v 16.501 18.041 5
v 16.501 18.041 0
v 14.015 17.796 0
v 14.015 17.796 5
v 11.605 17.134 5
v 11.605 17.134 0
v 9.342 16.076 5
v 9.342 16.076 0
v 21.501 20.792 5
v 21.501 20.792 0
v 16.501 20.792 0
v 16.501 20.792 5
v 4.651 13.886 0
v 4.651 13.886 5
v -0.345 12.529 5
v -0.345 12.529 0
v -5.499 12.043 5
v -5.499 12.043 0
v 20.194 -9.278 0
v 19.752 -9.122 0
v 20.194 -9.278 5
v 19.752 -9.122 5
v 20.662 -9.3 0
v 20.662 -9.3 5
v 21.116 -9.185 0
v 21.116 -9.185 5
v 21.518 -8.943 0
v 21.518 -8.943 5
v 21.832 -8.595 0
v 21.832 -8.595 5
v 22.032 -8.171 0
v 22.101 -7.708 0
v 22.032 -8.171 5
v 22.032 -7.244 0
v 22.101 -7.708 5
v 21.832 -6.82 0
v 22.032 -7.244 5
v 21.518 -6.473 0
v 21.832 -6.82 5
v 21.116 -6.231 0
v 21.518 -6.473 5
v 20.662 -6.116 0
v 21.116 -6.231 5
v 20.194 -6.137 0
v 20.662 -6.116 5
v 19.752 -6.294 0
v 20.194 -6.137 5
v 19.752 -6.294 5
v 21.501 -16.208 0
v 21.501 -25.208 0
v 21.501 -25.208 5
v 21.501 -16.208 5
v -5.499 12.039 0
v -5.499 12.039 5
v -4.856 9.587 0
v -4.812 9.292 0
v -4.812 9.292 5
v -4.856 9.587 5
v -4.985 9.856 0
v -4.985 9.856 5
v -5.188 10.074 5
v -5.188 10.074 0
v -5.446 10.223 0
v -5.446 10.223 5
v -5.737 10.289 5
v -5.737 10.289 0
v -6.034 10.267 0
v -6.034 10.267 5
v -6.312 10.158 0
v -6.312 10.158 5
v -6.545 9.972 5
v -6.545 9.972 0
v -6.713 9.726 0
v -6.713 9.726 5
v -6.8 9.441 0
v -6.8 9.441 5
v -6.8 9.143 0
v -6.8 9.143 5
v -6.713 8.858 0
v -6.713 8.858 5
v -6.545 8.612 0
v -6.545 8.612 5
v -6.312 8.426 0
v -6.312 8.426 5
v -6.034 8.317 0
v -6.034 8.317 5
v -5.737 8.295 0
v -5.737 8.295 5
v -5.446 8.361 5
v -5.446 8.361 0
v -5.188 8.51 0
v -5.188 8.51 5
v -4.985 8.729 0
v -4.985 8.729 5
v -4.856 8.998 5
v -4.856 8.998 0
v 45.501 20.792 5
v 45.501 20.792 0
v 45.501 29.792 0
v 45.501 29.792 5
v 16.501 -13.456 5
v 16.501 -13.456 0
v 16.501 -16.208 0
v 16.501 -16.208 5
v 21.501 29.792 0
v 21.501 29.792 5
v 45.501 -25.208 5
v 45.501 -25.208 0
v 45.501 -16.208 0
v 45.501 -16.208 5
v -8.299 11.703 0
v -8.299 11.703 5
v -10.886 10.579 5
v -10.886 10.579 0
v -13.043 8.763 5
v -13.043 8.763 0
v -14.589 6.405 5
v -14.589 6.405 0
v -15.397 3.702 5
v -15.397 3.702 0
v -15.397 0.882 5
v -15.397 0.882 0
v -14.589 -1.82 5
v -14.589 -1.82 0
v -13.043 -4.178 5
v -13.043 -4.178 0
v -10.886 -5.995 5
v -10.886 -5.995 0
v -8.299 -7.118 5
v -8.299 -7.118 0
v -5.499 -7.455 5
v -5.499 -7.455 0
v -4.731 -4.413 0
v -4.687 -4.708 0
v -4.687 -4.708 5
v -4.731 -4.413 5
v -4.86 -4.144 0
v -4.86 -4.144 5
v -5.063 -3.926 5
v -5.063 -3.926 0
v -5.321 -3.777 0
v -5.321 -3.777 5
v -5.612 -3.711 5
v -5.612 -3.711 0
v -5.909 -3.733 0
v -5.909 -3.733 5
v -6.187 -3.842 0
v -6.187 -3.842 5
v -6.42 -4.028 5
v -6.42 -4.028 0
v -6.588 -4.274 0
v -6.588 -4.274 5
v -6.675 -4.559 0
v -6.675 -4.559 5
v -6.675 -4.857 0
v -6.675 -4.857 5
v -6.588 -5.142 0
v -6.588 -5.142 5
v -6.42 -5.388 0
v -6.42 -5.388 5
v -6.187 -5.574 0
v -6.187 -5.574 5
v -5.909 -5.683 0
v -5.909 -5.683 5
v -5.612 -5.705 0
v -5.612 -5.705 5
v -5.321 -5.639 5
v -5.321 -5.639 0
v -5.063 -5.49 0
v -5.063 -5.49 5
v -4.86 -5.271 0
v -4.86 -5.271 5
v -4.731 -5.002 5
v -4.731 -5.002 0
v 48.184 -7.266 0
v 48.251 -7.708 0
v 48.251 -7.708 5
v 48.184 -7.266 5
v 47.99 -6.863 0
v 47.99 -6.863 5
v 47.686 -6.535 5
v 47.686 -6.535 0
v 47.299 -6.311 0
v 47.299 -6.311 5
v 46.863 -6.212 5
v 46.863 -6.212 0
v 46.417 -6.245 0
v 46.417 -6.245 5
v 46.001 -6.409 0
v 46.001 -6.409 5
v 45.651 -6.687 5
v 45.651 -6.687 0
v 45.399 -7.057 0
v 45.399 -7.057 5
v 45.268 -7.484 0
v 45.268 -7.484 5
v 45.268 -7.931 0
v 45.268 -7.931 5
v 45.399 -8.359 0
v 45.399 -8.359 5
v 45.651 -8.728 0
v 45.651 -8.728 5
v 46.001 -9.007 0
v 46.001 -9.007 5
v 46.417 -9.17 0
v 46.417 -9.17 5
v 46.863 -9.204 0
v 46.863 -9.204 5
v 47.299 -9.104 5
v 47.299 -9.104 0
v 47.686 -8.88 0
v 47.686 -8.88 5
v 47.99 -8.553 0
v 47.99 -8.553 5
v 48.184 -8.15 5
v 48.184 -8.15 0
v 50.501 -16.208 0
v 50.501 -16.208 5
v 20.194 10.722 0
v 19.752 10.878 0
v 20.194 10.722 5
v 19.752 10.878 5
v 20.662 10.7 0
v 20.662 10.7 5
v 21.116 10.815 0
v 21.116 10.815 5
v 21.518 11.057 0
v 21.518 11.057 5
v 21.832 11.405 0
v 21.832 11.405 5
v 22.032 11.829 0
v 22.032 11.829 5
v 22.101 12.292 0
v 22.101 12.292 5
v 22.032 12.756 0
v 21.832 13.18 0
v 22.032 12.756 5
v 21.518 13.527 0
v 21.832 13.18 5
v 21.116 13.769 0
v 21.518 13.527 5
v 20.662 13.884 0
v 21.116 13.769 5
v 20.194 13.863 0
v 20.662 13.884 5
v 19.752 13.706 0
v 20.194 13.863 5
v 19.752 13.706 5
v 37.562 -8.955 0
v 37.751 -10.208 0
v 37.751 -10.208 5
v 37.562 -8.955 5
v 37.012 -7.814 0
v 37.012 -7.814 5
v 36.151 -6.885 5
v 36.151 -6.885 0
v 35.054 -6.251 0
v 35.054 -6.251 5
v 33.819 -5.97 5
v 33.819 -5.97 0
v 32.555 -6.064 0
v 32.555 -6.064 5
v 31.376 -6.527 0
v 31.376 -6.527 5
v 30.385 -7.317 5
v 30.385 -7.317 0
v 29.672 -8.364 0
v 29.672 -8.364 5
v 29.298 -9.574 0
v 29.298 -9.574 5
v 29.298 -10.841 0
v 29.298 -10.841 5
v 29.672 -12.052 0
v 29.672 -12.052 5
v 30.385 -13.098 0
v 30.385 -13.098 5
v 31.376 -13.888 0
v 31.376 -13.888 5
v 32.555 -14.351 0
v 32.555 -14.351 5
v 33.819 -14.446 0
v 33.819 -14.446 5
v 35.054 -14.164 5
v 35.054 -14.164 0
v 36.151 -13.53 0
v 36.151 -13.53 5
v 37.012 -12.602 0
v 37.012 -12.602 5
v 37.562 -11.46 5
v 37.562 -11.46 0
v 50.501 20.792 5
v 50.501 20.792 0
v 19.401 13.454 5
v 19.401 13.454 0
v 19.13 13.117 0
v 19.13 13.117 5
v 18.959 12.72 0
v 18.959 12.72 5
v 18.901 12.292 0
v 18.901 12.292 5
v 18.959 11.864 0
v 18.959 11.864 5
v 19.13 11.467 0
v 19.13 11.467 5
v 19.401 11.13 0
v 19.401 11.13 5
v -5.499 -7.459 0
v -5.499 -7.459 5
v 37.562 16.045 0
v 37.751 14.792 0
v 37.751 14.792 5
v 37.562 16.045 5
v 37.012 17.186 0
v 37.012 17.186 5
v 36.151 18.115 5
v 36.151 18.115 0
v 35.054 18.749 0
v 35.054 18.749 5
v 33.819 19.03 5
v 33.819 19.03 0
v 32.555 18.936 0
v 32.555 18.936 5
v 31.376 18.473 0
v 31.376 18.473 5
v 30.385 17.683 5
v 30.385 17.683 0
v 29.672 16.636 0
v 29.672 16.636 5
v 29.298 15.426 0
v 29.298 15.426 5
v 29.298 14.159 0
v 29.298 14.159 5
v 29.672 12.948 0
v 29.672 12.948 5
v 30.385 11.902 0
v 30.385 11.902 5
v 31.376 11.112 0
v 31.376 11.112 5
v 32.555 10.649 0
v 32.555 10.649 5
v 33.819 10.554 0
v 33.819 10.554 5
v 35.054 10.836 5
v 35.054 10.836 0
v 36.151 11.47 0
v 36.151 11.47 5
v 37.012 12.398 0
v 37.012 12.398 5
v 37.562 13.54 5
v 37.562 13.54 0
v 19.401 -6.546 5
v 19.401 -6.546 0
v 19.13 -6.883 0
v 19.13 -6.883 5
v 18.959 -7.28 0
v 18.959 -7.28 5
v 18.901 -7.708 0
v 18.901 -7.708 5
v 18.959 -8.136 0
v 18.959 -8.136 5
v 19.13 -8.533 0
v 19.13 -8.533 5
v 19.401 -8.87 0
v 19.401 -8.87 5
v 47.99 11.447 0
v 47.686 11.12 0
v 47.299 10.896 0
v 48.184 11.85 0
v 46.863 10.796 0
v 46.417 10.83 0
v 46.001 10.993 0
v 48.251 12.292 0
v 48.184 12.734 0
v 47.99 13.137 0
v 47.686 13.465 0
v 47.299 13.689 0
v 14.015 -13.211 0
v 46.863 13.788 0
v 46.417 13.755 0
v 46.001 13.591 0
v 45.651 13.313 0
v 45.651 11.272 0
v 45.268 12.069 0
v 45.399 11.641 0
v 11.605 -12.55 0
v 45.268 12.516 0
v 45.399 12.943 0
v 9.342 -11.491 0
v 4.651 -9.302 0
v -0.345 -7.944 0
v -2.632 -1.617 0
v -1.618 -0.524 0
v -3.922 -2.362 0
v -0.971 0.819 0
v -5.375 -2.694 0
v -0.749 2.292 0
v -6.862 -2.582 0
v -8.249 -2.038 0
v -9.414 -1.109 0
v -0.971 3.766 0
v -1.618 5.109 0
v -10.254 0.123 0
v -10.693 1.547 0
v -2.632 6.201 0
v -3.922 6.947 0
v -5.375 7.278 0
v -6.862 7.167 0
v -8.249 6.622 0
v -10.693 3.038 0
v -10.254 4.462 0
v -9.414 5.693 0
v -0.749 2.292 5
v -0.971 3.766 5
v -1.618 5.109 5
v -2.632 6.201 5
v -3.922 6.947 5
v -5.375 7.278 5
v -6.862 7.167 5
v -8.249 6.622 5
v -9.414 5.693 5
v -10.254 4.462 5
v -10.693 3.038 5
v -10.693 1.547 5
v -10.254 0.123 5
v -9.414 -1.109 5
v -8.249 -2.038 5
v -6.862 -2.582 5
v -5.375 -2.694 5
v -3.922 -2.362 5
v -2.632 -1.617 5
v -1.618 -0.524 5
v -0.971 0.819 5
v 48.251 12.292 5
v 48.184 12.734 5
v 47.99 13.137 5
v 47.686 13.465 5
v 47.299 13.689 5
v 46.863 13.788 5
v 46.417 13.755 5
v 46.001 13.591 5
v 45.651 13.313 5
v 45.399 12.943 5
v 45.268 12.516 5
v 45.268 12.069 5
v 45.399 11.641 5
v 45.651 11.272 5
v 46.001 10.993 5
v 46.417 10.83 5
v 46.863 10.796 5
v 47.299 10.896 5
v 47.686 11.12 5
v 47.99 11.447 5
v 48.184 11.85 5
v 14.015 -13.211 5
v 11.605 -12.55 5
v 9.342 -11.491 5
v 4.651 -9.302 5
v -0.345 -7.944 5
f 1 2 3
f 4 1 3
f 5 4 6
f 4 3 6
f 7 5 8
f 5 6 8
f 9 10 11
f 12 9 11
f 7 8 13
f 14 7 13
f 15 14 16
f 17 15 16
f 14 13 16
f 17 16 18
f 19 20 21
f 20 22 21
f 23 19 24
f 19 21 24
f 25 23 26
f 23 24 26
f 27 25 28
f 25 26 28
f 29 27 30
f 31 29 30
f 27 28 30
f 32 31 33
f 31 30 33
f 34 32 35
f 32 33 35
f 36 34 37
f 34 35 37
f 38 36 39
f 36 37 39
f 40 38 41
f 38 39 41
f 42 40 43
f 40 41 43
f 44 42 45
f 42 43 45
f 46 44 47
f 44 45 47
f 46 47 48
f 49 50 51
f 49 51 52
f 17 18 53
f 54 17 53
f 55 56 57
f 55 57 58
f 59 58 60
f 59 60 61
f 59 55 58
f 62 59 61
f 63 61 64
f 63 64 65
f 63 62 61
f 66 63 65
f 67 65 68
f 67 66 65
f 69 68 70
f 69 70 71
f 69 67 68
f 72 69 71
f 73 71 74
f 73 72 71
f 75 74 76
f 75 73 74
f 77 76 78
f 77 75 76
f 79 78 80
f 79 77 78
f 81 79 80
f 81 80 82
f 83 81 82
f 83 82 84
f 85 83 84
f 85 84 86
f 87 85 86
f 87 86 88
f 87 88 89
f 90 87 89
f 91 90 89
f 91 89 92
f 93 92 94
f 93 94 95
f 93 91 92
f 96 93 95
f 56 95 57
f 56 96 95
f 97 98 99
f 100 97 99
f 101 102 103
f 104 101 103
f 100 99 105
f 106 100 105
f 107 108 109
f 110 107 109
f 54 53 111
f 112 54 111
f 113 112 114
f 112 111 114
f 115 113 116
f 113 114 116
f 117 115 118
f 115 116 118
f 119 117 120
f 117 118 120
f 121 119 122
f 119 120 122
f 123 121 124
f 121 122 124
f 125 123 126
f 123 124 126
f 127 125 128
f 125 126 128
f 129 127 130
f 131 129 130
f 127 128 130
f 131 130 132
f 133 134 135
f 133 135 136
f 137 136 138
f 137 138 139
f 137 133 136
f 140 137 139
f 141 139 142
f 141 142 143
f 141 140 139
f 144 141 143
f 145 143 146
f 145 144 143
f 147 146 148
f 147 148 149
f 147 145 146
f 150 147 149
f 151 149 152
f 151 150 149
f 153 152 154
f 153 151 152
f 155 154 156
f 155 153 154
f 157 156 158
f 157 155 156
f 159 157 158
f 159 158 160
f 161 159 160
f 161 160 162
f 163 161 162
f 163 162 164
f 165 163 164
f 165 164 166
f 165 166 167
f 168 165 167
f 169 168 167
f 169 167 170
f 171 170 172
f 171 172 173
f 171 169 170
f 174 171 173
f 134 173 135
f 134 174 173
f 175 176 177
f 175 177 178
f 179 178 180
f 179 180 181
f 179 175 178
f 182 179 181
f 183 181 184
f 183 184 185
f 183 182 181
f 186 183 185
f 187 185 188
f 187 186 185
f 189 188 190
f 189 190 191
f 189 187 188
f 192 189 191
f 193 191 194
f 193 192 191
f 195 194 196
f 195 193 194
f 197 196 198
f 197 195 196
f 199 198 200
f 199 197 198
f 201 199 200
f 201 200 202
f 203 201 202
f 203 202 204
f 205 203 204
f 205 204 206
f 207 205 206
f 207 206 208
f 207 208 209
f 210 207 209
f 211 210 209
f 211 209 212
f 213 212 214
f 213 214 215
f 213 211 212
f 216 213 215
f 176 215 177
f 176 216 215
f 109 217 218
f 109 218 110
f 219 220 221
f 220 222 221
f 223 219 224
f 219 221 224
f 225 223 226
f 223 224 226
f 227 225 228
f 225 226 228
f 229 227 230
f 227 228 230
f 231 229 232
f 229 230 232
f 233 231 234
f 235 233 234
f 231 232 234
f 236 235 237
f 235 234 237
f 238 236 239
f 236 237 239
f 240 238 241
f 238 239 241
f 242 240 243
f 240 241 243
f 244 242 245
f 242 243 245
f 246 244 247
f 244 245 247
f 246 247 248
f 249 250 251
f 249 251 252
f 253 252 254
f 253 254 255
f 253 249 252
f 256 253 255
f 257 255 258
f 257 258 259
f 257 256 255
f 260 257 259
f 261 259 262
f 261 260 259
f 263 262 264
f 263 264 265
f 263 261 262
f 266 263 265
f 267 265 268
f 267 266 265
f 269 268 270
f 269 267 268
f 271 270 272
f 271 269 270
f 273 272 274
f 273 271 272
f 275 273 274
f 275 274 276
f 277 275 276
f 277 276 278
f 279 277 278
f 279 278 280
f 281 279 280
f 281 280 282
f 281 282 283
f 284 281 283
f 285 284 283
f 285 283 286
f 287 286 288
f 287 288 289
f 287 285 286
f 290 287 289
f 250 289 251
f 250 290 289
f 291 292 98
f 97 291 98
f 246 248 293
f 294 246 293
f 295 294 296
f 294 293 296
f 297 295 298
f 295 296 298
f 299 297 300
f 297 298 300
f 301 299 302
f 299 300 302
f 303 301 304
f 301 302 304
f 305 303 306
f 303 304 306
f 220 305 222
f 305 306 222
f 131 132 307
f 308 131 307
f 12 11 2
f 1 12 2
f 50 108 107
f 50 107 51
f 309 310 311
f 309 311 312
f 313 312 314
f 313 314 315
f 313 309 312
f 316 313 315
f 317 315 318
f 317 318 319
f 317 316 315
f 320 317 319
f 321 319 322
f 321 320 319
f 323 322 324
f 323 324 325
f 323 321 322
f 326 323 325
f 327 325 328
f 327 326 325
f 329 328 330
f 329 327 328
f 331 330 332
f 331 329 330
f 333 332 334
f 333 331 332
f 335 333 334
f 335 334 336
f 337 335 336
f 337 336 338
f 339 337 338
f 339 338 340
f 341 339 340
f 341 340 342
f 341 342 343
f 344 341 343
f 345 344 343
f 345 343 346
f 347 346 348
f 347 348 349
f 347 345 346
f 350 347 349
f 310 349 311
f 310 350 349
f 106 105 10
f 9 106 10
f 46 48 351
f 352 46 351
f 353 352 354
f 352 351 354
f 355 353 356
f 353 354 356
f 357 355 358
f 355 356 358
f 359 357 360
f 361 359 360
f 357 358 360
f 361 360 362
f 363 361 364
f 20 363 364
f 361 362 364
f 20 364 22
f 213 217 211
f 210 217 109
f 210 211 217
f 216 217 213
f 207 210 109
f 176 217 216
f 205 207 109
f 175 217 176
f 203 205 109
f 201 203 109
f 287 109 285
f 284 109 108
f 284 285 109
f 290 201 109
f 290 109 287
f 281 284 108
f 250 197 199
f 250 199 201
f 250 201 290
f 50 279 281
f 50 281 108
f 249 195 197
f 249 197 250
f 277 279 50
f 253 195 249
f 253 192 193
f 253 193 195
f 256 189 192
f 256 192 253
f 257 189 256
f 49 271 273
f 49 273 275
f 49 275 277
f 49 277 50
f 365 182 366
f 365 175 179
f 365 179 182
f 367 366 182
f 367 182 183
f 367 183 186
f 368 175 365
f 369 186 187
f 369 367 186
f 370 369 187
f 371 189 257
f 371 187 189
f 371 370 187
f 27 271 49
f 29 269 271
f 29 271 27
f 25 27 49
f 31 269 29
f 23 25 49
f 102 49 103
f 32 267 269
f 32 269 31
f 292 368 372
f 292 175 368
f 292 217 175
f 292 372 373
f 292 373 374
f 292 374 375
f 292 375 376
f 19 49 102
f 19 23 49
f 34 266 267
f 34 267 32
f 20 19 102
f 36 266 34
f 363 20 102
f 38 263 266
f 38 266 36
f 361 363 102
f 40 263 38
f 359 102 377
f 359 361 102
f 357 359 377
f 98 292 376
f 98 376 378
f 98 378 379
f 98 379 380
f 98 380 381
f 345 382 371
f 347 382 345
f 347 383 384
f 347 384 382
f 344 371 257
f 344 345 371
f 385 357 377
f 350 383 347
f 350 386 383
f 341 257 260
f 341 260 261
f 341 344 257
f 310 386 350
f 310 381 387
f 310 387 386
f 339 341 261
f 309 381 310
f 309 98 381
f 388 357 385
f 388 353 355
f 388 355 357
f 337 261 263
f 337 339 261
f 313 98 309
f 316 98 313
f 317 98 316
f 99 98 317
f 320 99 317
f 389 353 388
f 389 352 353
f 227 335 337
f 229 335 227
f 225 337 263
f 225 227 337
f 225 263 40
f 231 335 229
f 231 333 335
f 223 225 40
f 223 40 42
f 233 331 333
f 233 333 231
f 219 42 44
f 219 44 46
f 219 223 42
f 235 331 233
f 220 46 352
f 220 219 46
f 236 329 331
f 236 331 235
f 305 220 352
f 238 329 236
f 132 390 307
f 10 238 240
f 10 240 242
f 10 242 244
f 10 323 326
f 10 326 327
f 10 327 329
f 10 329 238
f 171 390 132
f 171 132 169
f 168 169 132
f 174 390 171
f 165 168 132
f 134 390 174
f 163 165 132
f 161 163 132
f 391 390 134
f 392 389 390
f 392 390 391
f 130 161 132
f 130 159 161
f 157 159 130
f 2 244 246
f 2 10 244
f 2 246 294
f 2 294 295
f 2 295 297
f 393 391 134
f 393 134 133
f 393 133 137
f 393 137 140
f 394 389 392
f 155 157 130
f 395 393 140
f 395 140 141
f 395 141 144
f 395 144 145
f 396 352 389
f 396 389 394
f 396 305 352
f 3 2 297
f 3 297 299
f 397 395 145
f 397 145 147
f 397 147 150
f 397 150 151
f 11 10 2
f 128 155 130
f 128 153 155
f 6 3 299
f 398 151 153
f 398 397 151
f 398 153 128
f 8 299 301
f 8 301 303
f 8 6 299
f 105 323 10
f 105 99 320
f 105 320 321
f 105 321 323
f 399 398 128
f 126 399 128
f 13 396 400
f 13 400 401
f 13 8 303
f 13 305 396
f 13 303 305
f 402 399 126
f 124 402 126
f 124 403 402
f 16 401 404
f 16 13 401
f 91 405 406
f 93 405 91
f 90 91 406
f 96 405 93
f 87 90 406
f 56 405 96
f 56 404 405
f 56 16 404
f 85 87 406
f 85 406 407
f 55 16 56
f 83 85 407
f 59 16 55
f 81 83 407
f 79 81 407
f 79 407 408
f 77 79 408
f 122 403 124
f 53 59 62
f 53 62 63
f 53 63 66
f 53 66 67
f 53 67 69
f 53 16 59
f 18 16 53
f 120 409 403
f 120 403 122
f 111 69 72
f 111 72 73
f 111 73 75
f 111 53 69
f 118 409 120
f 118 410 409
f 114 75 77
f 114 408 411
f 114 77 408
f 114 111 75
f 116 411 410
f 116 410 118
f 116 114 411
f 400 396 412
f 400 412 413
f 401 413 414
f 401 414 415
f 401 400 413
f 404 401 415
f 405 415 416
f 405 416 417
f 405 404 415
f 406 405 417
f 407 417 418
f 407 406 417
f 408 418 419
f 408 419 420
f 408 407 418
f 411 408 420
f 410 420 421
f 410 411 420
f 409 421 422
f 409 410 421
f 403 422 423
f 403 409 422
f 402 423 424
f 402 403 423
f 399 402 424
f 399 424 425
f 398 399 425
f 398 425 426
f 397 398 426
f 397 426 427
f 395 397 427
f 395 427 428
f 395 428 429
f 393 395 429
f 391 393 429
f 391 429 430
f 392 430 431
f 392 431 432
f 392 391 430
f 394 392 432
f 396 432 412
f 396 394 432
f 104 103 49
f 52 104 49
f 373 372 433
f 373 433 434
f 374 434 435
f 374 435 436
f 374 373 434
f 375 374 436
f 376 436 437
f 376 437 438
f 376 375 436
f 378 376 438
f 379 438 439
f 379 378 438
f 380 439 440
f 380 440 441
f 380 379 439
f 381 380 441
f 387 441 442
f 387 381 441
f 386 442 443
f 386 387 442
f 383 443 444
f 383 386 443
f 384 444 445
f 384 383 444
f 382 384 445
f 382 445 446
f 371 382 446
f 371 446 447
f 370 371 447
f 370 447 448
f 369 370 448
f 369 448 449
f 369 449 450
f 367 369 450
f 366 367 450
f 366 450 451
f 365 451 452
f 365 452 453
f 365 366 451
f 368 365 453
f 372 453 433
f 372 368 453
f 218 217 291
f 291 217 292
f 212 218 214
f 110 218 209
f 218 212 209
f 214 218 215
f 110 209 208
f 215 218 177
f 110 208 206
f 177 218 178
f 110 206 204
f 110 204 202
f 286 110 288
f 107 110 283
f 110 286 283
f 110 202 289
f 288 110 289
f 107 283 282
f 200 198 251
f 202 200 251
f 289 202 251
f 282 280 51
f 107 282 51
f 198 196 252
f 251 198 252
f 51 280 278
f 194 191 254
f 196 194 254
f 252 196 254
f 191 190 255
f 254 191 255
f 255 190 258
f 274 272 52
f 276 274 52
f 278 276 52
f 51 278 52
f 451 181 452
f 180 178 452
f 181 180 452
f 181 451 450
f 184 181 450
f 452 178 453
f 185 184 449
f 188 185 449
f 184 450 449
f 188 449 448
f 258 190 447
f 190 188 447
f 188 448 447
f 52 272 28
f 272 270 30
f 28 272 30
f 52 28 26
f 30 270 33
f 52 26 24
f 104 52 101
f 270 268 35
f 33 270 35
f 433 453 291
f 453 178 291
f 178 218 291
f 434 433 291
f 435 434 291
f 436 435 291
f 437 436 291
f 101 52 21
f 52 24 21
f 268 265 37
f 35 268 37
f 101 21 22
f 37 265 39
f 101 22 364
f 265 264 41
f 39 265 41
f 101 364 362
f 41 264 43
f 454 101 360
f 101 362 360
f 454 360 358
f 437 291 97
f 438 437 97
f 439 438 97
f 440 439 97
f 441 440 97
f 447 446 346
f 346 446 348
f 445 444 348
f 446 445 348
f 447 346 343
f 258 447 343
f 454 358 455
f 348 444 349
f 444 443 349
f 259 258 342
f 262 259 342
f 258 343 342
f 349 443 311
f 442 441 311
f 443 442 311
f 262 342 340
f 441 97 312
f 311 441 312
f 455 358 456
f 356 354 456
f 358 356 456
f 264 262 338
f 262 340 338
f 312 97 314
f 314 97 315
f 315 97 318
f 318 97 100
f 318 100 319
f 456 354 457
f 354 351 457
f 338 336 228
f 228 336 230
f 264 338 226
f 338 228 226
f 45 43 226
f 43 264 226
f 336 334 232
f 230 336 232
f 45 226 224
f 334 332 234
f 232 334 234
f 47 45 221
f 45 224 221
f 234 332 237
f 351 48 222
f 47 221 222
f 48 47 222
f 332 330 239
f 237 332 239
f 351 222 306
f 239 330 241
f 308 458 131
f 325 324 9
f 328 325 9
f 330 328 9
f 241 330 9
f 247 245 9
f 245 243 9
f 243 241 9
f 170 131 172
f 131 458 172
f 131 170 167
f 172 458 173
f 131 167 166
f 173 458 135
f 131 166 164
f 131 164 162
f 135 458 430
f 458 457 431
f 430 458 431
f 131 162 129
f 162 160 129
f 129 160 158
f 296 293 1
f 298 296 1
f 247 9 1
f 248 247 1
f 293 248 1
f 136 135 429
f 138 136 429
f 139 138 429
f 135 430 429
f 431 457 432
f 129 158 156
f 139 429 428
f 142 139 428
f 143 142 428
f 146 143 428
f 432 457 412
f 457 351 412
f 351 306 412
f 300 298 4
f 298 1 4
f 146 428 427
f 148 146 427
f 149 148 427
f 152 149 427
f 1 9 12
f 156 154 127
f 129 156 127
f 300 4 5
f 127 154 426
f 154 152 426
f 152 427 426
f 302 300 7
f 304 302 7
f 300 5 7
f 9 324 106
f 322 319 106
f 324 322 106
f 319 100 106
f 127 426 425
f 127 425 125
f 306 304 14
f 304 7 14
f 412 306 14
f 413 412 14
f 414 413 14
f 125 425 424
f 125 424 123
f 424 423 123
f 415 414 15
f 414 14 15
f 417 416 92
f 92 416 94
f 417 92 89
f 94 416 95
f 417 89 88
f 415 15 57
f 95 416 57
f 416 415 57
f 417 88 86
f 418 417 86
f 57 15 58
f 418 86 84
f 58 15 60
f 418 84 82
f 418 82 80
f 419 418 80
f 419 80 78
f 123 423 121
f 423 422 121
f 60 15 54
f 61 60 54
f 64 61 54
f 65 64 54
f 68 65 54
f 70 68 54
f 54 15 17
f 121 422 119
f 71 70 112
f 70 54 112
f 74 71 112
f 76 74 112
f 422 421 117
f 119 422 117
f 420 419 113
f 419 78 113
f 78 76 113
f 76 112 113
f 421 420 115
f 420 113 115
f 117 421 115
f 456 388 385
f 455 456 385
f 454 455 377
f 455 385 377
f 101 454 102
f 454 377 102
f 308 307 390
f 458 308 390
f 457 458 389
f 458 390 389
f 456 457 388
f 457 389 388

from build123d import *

# Parameters (mm, degrees)
SKETCH1_R           = 1.5
SKETCH1_R_2         = 4.25
SKETCH1_R_3         = 5
SKETCH1_R_4         = 1
BOSS_EXTRUDE2_DEPTH = 5
SKETCH2_W           = 0.5
SKETCH2_H           = 37
BOSS_EXTRUDE3_DEPTH = 5
CUT_EXTRUDE1_DEPTH  = 10
BOSS_EXTRUDE4_DEPTH = 5
SKETCH5_R           = 1.6
CUT_EXTRUDE2_DEPTH  = 10
BOSS_EXTRUDE5_DEPTH = 5
SKETCH7_R           = 1
BOSS_EXTRUDE6_DEPTH = 5


with BuildPart() as part:
    # Sketch1 → Boss-Extrude2 (new body)
    with BuildSketch(Plane.XY):
        with BuildLine():
            Line((45.25091594, -25.207708346), (50.00091594, -20.457708346))
            Line((50.00091594, -20.457708346), (50.00091594, 24.688738263))
            Line((50.00091594, 24.688738263), (45.147362549, 29.542291654))
            Line((45.147362549, 29.542291654), (26.35446933, 29.542291654))
            Line((26.35446933, 29.542291654), (21.25091594, 24.438738263))
            Line((21.25091594, 24.438738263), (21.25091594, 18.042291654))
            Line((21.25091594, 18.042291654), (20.408095363, 18.042291654))
            Line((20.408095363, 18.042291654), (16.70086026, 18.042291654))
            ThreePointArc((16.70086026, 18.042291654), (12.892426636, 17.542145454), (9.3422674, 16.075624987))
            ThreePointArc((9.3422674, 16.075624987), (2.182128173, 13.100539865), (-5.49908406, 12.043324729))
            Line((-5.49908406, 12.043324729), (-5.49908406, 12.039085999))
            ThreePointArc((-5.49908406, 12.039085999), (-15.49908406, 2.292291654), (-5.49908406, -7.454502691))
            Line((-5.49908406, -7.454502691), (-5.49908406, -7.458741422))
            ThreePointArc((-5.49908406, -7.458741422), (2.182128173, -8.515956557), (9.3422674, -11.491041679))
            ThreePointArc((9.3422674, -11.491041679), (12.892426636, -12.957562146), (16.70086026, -13.457708346))
            Line((16.70086026, -13.457708346), (20.408095363, -13.457708346))
            Line((20.408095363, -13.457708346), (21.25091594, -13.457708346))
            Line((21.25091594, -13.457708346), (21.25091594, -20.207708346))
            Line((21.25091594, -20.207708346), (26.25091594, -25.207708346))
            Line((26.25091594, -25.207708346), (45.25091594, -25.207708346))
        make_face()
        with Locations((46.75091594, -7.707708346)):
            Circle(SKETCH1_R, mode=Mode.SUBTRACT)
        with Locations((46.75091594, 12.292291654)):
            Circle(SKETCH1_R, mode=Mode.SUBTRACT)
        with Locations((33.50091594, 14.792291654)):
            Circle(SKETCH1_R_2, mode=Mode.SUBTRACT)
        with Locations((33.50091594, -10.207708346)):
            Circle(SKETCH1_R_2, mode=Mode.SUBTRACT)
        with Locations((19.25091594, 12.292291654)):
            Circle(SKETCH1_R, mode=Mode.SUBTRACT)
        with Locations((19.25091594, -7.707708346)):
            Circle(SKETCH1_R, mode=Mode.SUBTRACT)
        with Locations((-5.74908406, 2.292291654)):
            Circle(SKETCH1_R_3, mode=Mode.SUBTRACT)
        with Locations((1.25091594, 2.354746229)):
            Circle(SKETCH1_R_4, mode=Mode.SUBTRACT)
        with Locations((-5.686629485, -4.707708346)):
            Circle(SKETCH1_R_4, mode=Mode.SUBTRACT)
        with Locations((-12.74908406, 2.229837079)):
            Circle(SKETCH1_R_4, mode=Mode.SUBTRACT)
        with Locations((-5.811538636, 9.292291654)):
            Circle(SKETCH1_R_4, mode=Mode.SUBTRACT)
    extrude(amount=BOSS_EXTRUDE2_DEPTH)

    # Sketch2 → Boss-Extrude3 (add)
    with BuildSketch(Plane(origin=(0, 0, 0), x_dir=(-1, 0, 0), z_dir=(0, 0, -1))):
        Polygon((-26.25091594, -25.207708346), (-21.50091594, -25.207708346), (-21.50091594, -20.457708346), align=None)
        Polygon((-45.25091594, -25.207708346), (-45.50091594, -25.207708346), (-45.50091594, -24.957708346), align=None)
        Polygon((-45.50091594, 29.188738263), (-45.50091594, 29.792291654), (-21.50091594, 29.792291654), (-21.50091594, 24.688738263), (-26.35446933, 29.542291654), (-45.147362549, 29.542291654), align=None)
        with Locations((-50.25091594, 2.292291654)):
            Rectangle(SKETCH2_W, SKETCH2_H)
    extrude(amount=-BOSS_EXTRUDE3_DEPTH)

    # Sketch3 → Cut-Extrude1 (cut)
    with BuildSketch(Plane(origin=(0, 0, 0), x_dir=(-1, 0, 0), z_dir=(0, 0, -1))):
        Polygon((-50.00091594, -16.207708346), (-45.50091594, -16.207708346), (-45.50091594, -25.207708346), (-50.00091594, -20.457708346), align=None)
        Polygon((-50.50091594, 20.792291654), (-45.50091594, 20.792291654), (-45.50091594, 29.188738263), (-50.00091594, 24.688738263), align=None)
        Polygon((-21.50091594, -16.207708346), (-21.50091594, -20.457708346), (-21.25091594, -20.207708346), (-21.25091594, -16.207708346), align=None)
        Polygon((-21.50091594, 20.792291654), (-21.25091594, 20.792291654), (-21.25091594, 24.438738263), (-21.50091594, 24.688738263), align=None)
    extrude(amount=-CUT_EXTRUDE1_DEPTH, mode=Mode.SUBTRACT)

    # Sketch4 → Boss-Extrude4 (add)
    with BuildSketch(Plane(origin=(0, 0, 0), x_dir=(-1, 0, 0), z_dir=(0, 0, -1))):
        with BuildLine():
            Line((-21.25091594, 20.792291654), (-16.50091594, 20.792291654))
            Line((-16.50091594, 20.792291654), (-16.50091594, 18.040936414))
            ThreePointArc((-16.50091594, 18.040936414), (-16.600885803, 18.04195284), (-16.70086026, 18.042291654))
            Line((-16.70086026, 18.042291654), (-21.25091594, 18.042291654))
            Line((-21.25091594, 18.042291654), (-21.25091594, 20.792291654))
        make_face()
        with BuildLine():
            Line((-16.50091594, -13.456353106), (-16.50091594, -16.207708346))
            Line((-16.50091594, -16.207708346), (-21.25091594, -16.207708346))
            Line((-21.25091594, -16.207708346), (-21.25091594, -13.457708346))
            Line((-21.25091594, -13.457708346), (-16.70086026, -13.457708346))
            ThreePointArc((-16.70086026, -13.457708346), (-16.600885803, -13.457369532), (-16.50091594, -13.456353106))
        make_face()
    extrude(amount=-BOSS_EXTRUDE4_DEPTH)

    # Sketch5 → Cut-Extrude2 (cut)
    with BuildSketch(Plane.XY.offset(5)):
        with Locations((20.50091594, -7.707708346)):
            Circle(SKETCH5_R)
        with Locations((20.50091594, 12.292291654)):
            Circle(SKETCH5_R)
    extrude(amount=-CUT_EXTRUDE2_DEPTH, mode=Mode.SUBTRACT)

    # Sketch6 → Boss-Extrude5 (add)
    with BuildSketch(Plane.XY.offset(5)):
        with BuildLine():
            ThreePointArc((19.75191594, -6.293848735), (18.90091594, -7.707708346), (19.75191594, -9.121567957))
            ThreePointArc((19.75191594, -9.121567957), (17.75091594, -7.707708346), (19.75191594, -6.293848735))
        make_face()
        with BuildLine():
            ThreePointArc((19.75191594, 13.706151265), (18.90091594, 12.292291654), (19.75191594, 10.878432043))
            ThreePointArc((19.75191594, 10.878432043), (17.75091594, 12.292291654), (19.75191594, 13.706151265))
        make_face()
    extrude(amount=-BOSS_EXTRUDE5_DEPTH)

    # Sketch7 → Boss-Extrude6 (add)
    with BuildSketch(Plane(origin=(0, 0, 0), x_dir=(-1, 0, 0), z_dir=(0, 0, -1))):
        with Locations((-1.25091594, 2.354746229)):
            Circle(SKETCH7_R)
        with Locations((12.74908406, 2.229837079)):
            Circle(SKETCH7_R)
    extrude(amount=-BOSS_EXTRUDE6_DEPTH)


solid = part.part
